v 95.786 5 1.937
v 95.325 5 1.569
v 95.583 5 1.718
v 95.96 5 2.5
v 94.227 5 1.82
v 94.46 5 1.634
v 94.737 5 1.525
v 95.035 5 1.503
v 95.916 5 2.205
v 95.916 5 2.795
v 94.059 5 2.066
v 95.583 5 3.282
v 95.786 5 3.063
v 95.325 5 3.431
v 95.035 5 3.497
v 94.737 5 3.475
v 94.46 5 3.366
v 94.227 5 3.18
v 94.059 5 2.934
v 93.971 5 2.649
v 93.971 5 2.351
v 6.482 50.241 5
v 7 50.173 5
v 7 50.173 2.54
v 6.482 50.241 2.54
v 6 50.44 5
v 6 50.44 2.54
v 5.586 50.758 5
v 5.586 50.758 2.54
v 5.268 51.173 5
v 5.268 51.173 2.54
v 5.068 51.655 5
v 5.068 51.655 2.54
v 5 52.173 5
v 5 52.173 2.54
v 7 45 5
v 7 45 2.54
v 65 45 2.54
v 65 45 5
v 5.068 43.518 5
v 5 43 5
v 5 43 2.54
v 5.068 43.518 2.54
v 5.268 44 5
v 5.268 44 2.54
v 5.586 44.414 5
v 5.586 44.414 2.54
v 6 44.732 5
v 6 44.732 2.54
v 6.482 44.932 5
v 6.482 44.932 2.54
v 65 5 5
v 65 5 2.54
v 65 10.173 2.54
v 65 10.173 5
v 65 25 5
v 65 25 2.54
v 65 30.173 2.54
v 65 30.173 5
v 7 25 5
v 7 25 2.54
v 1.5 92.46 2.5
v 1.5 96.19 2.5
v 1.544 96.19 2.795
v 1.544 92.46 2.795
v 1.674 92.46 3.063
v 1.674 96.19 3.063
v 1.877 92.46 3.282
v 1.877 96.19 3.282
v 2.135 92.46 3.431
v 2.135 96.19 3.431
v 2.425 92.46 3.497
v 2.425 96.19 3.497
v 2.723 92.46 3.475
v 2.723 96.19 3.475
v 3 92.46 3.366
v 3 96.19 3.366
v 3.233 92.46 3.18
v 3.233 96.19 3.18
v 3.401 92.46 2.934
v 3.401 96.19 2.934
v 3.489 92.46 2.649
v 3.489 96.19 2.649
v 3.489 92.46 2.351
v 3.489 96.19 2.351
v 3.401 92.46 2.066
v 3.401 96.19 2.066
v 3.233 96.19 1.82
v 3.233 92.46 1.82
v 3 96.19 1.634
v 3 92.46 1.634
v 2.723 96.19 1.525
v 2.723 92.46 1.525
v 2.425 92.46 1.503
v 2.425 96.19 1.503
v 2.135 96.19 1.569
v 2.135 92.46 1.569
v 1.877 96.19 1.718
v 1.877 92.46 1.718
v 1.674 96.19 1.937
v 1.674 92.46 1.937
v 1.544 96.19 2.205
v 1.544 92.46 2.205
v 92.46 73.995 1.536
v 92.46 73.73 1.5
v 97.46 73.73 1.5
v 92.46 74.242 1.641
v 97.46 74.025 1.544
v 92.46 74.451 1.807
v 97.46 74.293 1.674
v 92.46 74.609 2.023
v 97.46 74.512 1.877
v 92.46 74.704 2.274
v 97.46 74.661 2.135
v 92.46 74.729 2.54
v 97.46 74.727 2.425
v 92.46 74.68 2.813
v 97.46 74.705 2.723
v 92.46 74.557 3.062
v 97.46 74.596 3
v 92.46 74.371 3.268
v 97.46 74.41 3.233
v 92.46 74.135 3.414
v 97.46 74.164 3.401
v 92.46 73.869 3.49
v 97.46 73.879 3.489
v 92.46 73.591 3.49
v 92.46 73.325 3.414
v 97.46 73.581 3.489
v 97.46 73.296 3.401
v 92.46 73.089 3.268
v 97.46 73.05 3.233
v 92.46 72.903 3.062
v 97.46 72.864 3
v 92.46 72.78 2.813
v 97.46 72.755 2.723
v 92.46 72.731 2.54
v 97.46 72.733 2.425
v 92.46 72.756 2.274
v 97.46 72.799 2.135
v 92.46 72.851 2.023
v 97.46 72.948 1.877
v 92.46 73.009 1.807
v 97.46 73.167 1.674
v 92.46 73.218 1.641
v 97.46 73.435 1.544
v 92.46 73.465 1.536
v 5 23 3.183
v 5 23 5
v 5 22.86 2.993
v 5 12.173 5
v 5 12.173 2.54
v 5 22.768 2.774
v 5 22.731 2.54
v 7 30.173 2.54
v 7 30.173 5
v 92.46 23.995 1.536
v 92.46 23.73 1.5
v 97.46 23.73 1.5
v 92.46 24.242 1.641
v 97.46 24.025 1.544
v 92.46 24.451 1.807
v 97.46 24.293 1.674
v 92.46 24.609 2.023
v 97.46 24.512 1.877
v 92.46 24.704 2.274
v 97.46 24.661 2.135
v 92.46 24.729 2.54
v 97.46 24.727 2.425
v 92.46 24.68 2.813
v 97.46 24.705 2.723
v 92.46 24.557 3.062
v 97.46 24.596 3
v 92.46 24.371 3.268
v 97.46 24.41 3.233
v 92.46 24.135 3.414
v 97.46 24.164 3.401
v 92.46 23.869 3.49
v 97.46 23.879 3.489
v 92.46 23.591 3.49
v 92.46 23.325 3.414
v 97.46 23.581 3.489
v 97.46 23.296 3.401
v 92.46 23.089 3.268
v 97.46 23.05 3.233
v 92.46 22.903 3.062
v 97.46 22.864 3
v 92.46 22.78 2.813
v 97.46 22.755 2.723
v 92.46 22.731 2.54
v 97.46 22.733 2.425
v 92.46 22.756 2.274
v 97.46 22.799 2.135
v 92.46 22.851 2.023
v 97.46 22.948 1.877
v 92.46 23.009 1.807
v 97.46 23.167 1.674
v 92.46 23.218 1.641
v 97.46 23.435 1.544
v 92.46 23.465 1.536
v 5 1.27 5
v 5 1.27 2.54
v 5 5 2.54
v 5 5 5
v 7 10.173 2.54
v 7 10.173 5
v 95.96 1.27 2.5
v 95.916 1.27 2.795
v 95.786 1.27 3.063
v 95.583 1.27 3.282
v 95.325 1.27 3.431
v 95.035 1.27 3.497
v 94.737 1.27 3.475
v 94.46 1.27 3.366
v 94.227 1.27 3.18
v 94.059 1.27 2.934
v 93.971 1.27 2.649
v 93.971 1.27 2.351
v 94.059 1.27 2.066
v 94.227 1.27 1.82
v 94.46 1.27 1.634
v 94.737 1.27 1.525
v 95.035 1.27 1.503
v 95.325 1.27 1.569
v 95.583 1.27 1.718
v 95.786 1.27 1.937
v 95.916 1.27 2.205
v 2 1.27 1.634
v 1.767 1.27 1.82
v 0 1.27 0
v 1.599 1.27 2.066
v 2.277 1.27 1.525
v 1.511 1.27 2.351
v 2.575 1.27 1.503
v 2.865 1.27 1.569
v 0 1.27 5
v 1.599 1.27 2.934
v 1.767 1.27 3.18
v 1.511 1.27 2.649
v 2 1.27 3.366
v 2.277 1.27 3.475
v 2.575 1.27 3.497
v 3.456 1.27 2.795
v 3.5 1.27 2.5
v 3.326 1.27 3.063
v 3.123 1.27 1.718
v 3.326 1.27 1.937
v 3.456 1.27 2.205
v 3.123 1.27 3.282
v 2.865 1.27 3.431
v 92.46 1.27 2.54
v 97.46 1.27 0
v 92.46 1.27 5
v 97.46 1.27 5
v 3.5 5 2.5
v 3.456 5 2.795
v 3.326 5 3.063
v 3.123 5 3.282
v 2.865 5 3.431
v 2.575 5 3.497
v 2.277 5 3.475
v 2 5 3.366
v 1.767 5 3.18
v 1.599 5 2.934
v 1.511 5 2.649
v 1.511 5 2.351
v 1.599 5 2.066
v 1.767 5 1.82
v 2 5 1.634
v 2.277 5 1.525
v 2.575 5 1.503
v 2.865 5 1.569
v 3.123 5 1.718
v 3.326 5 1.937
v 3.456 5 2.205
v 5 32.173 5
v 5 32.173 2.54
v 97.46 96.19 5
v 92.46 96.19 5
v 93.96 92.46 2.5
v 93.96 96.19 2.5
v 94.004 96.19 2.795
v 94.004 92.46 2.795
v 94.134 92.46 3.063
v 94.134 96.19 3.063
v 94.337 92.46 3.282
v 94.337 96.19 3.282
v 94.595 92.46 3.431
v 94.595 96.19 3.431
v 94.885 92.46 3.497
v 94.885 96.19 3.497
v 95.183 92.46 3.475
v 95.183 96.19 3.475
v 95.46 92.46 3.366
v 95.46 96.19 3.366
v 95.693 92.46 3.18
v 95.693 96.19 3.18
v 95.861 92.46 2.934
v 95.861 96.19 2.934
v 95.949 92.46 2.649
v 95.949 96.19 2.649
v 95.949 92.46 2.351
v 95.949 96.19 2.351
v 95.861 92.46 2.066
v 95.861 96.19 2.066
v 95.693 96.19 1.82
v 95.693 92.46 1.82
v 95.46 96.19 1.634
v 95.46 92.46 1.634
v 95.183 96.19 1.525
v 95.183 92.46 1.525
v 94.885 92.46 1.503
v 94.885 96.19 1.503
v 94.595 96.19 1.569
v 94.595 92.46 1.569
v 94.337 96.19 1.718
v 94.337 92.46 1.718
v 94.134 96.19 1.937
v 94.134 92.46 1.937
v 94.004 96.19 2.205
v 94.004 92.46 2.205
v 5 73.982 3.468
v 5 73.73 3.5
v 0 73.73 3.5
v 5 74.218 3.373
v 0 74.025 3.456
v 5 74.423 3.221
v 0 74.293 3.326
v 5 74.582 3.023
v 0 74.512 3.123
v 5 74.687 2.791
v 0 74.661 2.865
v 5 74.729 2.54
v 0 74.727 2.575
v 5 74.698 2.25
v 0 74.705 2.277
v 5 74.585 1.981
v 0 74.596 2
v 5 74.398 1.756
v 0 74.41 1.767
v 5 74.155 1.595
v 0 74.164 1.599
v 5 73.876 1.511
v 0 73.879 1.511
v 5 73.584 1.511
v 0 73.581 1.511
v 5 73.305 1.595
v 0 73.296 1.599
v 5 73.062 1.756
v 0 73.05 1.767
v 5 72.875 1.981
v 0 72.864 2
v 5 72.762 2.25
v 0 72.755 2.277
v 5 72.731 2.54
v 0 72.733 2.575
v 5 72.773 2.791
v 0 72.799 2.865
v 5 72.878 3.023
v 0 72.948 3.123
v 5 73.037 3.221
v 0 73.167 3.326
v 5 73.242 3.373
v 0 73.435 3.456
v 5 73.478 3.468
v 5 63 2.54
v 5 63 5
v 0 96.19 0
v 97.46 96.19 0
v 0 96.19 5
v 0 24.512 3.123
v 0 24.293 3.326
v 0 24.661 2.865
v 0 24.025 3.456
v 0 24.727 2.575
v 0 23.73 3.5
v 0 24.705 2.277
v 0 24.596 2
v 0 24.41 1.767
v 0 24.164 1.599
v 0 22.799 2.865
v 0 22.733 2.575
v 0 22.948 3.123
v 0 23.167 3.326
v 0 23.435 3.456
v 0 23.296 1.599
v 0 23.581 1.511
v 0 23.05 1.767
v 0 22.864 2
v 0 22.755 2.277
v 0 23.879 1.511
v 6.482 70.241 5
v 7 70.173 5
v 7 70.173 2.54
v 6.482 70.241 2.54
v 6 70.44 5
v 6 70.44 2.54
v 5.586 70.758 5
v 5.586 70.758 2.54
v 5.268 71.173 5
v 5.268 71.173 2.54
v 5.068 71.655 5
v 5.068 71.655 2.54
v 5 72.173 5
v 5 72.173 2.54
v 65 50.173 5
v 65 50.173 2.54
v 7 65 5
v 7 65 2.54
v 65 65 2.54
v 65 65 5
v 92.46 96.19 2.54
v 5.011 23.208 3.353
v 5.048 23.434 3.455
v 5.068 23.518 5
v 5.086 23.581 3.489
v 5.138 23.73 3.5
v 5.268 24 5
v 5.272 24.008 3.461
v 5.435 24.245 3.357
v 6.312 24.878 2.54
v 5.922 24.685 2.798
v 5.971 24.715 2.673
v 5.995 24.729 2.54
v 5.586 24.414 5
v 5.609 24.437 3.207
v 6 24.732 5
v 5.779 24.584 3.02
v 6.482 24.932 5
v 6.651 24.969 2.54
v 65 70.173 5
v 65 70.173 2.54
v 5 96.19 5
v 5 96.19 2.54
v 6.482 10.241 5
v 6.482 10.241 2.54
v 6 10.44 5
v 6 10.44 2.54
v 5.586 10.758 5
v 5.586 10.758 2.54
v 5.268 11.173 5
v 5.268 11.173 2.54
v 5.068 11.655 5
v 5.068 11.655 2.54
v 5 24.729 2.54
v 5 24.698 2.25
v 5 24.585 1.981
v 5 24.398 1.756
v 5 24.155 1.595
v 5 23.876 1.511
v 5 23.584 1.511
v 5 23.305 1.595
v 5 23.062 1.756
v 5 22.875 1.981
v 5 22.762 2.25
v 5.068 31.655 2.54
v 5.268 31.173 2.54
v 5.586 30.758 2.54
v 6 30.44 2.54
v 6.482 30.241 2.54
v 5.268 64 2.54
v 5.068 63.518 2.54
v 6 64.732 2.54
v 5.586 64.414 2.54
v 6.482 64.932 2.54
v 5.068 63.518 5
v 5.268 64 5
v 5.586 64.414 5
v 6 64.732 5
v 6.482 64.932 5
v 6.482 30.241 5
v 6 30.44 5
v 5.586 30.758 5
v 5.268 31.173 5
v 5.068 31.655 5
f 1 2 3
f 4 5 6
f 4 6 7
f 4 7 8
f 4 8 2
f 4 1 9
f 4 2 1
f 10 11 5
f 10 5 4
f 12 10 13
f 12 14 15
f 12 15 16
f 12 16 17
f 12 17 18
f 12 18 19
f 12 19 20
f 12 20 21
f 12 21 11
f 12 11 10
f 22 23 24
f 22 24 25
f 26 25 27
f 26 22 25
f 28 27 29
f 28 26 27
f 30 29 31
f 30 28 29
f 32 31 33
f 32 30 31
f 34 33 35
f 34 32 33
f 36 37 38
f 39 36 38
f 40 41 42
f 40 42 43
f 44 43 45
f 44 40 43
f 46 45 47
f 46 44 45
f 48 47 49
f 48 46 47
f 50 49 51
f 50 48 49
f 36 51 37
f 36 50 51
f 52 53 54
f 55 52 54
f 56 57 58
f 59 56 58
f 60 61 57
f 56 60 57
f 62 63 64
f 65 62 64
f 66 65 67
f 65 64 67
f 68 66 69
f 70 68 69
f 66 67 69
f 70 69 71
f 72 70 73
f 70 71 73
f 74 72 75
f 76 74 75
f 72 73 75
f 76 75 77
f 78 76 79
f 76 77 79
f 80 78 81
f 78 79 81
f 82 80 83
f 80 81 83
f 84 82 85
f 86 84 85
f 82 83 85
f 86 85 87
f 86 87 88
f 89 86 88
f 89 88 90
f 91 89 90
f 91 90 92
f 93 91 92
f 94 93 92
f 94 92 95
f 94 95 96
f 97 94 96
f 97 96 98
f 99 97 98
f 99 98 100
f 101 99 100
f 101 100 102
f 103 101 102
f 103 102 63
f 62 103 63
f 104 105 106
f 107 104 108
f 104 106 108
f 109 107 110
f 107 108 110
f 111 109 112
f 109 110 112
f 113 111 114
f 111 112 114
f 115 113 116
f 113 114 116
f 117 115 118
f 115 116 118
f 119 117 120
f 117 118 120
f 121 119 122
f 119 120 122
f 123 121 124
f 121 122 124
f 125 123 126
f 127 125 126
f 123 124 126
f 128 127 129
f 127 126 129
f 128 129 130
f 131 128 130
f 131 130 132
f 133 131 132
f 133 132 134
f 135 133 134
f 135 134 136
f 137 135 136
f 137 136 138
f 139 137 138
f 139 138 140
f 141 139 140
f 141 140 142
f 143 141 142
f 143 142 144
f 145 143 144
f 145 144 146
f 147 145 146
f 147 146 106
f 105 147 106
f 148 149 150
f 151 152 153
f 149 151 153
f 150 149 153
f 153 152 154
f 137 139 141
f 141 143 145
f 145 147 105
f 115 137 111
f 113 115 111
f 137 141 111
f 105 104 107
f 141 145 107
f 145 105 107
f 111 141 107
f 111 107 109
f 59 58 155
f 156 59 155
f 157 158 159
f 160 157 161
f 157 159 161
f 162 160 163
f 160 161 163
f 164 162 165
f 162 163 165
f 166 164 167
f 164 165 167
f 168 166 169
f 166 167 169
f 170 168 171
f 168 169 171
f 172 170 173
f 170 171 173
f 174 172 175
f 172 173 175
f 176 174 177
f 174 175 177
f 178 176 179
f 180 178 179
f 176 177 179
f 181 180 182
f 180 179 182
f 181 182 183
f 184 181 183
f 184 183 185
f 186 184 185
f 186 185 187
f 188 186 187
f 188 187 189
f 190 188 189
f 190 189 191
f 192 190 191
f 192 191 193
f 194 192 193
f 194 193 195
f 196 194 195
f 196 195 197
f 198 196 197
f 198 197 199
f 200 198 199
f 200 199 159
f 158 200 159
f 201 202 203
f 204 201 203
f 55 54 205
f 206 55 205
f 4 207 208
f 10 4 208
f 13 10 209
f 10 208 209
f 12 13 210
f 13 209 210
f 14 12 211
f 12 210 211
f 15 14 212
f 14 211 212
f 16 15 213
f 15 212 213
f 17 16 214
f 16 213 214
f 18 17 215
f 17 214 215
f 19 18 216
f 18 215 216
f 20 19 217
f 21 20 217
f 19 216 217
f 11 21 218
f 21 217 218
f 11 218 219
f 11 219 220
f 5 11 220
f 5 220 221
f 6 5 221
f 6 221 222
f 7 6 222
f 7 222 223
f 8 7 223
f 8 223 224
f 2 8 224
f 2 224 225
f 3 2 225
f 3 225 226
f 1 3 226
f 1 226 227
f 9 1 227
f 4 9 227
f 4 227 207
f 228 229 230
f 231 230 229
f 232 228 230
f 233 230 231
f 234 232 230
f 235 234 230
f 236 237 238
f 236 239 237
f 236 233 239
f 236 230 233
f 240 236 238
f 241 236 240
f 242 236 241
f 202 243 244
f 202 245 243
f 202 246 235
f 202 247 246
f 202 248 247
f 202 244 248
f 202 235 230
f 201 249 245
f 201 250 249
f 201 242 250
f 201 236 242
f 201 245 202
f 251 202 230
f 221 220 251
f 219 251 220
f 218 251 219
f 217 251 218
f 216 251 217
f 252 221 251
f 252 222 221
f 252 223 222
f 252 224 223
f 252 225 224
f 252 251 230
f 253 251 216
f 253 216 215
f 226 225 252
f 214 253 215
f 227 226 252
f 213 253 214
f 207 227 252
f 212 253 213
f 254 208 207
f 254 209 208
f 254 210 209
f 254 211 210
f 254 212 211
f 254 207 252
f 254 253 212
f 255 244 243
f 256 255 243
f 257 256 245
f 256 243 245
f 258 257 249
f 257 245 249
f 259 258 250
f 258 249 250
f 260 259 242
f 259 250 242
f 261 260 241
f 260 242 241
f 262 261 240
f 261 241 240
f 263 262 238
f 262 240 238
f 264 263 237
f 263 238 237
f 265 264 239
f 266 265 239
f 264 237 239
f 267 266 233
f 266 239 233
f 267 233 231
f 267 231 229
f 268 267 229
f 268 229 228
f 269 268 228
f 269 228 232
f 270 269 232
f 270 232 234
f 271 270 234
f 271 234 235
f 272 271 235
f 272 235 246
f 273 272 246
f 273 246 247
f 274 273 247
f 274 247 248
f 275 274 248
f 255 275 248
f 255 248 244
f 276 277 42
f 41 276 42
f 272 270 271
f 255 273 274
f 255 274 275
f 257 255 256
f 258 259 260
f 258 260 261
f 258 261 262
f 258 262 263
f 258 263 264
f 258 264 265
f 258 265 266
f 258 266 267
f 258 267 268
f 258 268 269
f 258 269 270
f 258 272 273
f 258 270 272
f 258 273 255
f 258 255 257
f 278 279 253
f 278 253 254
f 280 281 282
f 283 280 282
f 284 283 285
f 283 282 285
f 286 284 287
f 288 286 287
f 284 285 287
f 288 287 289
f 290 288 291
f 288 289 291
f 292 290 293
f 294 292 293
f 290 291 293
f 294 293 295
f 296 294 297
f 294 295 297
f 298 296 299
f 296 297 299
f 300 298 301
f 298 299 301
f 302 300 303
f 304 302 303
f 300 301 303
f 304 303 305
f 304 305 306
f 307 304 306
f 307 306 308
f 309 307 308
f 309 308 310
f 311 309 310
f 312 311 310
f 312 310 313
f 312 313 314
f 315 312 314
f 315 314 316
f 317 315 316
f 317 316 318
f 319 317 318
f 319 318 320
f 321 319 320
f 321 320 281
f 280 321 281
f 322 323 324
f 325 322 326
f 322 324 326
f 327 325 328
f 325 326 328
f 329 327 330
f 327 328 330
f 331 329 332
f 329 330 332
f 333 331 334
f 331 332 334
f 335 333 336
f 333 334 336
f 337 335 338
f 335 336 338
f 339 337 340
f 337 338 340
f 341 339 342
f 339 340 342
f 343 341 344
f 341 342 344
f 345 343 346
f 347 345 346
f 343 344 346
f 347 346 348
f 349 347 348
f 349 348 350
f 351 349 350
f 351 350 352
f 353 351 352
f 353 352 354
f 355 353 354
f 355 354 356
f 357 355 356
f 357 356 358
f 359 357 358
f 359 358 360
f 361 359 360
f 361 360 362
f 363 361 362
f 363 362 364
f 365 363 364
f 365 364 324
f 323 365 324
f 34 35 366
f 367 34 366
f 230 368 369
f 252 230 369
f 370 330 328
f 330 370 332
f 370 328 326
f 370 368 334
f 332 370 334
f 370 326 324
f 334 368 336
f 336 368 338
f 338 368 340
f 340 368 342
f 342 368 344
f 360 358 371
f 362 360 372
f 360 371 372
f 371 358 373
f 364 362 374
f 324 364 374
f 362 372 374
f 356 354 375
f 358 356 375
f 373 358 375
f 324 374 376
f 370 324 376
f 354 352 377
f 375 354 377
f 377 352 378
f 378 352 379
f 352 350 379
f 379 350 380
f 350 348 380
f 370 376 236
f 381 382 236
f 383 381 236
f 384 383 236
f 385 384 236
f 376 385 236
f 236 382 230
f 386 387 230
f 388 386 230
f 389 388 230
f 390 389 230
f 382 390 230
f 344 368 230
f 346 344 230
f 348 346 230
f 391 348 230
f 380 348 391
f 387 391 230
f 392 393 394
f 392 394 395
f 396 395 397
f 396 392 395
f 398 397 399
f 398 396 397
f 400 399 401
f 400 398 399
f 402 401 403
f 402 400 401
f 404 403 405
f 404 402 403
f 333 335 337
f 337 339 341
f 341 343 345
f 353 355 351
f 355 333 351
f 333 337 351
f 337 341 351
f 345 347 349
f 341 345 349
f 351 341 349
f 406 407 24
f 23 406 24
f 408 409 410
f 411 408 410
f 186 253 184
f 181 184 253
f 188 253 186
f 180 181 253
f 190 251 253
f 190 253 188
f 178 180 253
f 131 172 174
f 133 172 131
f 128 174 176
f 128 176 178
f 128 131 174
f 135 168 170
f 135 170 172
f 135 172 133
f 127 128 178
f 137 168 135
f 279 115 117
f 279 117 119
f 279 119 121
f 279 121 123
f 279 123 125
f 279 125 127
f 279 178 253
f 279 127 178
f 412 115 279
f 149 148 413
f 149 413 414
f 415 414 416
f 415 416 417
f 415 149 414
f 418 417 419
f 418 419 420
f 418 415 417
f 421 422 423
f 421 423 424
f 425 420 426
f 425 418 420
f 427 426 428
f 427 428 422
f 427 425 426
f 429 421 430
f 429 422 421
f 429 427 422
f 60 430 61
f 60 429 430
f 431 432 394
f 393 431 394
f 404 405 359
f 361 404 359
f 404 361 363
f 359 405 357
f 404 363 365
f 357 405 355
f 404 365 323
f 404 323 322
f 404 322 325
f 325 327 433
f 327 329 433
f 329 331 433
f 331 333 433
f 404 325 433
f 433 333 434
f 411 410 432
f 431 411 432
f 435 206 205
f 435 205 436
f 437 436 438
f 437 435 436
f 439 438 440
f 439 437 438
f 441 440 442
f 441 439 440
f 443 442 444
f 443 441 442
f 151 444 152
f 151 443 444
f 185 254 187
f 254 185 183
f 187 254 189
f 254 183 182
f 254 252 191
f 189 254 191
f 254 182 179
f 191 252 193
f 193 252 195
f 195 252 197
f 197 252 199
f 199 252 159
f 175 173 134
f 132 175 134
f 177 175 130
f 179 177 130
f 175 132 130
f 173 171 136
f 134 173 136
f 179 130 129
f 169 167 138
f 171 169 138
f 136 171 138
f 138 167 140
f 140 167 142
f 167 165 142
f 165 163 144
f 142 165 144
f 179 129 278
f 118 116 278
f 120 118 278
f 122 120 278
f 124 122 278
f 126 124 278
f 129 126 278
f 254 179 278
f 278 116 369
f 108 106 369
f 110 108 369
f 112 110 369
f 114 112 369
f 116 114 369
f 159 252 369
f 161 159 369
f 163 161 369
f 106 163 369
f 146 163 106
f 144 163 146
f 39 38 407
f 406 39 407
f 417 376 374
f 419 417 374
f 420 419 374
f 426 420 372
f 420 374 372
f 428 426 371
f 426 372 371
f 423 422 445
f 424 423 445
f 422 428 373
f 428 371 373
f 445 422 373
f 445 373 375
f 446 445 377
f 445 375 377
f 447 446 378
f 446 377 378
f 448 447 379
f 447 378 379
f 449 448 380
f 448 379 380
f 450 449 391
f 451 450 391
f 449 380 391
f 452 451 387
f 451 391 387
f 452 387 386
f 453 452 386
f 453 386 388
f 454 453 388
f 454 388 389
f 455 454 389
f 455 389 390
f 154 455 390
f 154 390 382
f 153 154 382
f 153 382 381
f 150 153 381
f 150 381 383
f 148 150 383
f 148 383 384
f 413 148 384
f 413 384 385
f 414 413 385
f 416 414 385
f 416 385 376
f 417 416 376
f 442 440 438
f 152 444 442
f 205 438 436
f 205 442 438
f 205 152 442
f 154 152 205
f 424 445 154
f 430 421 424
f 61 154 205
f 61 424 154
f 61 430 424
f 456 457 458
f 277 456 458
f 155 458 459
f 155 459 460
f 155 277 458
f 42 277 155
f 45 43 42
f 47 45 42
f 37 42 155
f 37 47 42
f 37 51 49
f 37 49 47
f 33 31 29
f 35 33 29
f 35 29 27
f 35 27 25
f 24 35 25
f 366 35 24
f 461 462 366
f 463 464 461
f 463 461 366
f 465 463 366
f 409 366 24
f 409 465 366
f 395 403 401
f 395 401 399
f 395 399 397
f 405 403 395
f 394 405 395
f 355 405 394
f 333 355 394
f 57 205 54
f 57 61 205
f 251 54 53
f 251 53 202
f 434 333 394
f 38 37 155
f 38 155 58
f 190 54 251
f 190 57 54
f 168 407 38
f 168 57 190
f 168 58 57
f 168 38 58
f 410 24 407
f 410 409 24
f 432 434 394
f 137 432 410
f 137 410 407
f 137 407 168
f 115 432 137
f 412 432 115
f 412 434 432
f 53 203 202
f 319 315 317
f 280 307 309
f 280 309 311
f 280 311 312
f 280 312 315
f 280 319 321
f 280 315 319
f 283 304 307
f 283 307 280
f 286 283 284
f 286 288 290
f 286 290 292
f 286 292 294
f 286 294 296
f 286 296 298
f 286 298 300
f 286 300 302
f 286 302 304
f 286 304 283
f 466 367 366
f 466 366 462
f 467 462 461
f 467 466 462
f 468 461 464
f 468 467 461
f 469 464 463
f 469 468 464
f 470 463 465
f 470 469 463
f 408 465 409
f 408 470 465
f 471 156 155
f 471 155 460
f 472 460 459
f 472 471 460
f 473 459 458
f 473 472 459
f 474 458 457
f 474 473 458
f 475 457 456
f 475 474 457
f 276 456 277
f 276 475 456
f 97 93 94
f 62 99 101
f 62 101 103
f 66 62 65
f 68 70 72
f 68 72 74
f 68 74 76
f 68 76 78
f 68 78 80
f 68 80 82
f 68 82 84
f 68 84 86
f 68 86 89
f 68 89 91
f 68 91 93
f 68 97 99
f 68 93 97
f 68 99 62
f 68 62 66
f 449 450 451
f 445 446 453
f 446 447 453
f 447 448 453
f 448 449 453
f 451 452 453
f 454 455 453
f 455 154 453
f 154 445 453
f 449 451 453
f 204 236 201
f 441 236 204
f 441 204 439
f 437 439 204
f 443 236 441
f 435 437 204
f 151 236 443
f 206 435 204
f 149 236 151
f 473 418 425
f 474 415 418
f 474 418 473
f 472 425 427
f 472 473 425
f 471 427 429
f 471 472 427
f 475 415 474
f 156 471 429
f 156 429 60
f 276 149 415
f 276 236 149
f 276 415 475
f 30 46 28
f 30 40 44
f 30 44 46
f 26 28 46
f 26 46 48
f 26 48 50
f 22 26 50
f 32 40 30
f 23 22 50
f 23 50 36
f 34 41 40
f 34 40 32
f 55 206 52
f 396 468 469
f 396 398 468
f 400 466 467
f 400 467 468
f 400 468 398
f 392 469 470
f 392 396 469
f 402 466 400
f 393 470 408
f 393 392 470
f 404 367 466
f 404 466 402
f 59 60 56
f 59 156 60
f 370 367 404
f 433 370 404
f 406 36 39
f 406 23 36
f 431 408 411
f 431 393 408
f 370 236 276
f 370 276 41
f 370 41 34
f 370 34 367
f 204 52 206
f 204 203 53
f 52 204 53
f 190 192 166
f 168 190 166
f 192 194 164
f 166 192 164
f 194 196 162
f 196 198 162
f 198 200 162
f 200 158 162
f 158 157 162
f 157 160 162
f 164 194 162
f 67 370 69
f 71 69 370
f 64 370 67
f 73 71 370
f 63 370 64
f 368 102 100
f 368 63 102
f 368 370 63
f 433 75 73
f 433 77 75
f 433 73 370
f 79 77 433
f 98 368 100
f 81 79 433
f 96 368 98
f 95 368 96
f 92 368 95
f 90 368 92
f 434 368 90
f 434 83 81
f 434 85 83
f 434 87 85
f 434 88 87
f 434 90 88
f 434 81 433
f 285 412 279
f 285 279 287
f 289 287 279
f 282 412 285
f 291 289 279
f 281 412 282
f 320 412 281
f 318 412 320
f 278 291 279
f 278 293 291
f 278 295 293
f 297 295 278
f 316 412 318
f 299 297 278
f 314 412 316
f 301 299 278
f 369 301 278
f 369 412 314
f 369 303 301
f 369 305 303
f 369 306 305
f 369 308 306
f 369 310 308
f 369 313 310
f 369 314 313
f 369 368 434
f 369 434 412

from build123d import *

# Parameters (mm, degrees)
SKETCH1_W           = 97.46
SKETCH1_H           = 97.46
BOSS_EXTRUDE1_DEPTH = 1.27
SKETCH3_W           = 5
SKETCH3_H           = 97.46
BOSS_EXTRUDE2_DEPTH = 3.73
SKETCH7_R           = 1
CUT_EXTRUDE2_DEPTH  = 5
SKETCH6_R           = 1
CUT_EXTRUDE3_DEPTH  = 5
SKETCH4_R           = 1
CUT_EXTRUDE4_DEPTH  = 5
SKETCH5_R           = 1
CUT_EXTRUDE5_DEPTH  = 5
FILLET1_R           = 2
SKETCH8_R           = 1
CUT_EXTRUDE6_DEPTH  = 10
SKETCH9_R           = 1
CUT_EXTRUDE7_DEPTH  = 10
BOSS_EXTRUDE3_DEPTH = 1.27
CUT_EXTRUDE8_DEPTH  = 1.27
CUT_EXTRUDE9_DEPTH  = 1.27


with BuildPart() as part:
    # Sketch1 → Boss-Extrude1 (new body)
    with BuildSketch(Plane.XY):
        with Locations((48.73, 48.73)):
            Rectangle(SKETCH1_W, SKETCH1_H)
    extrude(amount=BOSS_EXTRUDE1_DEPTH)

    # Sketch3 → Boss-Extrude2 (add)
    with BuildSketch(Plane.XY.offset(1.27)):
        Polygon((0, 0), (5, 0), (5, 5), (65, 5), (65, 10.172513956), (5, 10.172513956), (5, 25), (65, 25), (65, 30.172513956), (5, 30.172513956), (5, 45), (65, 45), (65, 50.172513956), (5, 50.172513956), (5, 65), (65, 65), (65, 70.172513956), (5, 70.172513956), (5, 97.46), (0, 97.46), align=None)
        with Locations((94.96, 48.73)):
            Rectangle(SKETCH3_W, SKETCH3_H)
    extrude(amount=BOSS_EXTRUDE2_DEPTH)

    # Sketch7 → Cut-Extrude2 (cut)
    with BuildSketch(Plane(origin=(0, 97.46, 0), x_dir=(-1, 0, 0), z_dir=(0, 1, 0))):
        with Locations((-2.5, 2.5)):
            Circle(SKETCH7_R)
    extrude(amount=-CUT_EXTRUDE2_DEPTH, mode=Mode.SUBTRACT)

    # Sketch6 → Cut-Extrude3 (cut)
    with BuildSketch(Plane(origin=(0, 97.46, 0), x_dir=(-1, 0, 0), z_dir=(0, 1, 0))):
        with Locations((-94.96, 2.5)):
            Circle(SKETCH6_R)
    extrude(amount=-CUT_EXTRUDE3_DEPTH, mode=Mode.SUBTRACT)

    # Sketch4 → Cut-Extrude4 (cut)
    with BuildSketch(Plane.XZ):
        with Locations((94.96, 2.5)):
            Circle(SKETCH4_R)
    extrude(amount=-CUT_EXTRUDE4_DEPTH, mode=Mode.SUBTRACT)

    # Sketch5 → Cut-Extrude5 (cut)
    with BuildSketch(Plane.XZ):
        with Locations((2.5, 2.5)):
            Circle(SKETCH5_R)
    extrude(amount=-CUT_EXTRUDE5_DEPTH, mode=Mode.SUBTRACT)

    # Fillet1
    fillet1_edges = [part.edges().sort_by_distance(p)[0] for p in [
        (5, 70.172513956, 3.135),
        (5, 50.172513956, 3.135),
        (5, 30.172513956, 3.135),
        (5, 10.172513956, 3.135),
        (5, 65, 3.135),
        (5, 45, 3.135),
        (5, 25, 3.135),
    ]]
    fillet(fillet1_edges, radius=FILLET1_R)

    # Sketch8 → Cut-Extrude6 (cut)
    with BuildSketch(Plane.ZY):
        with Locations((2.5, 23.73)):
            Circle(SKETCH8_R)
        with Locations((2.5, 73.73)):
            Circle(SKETCH8_R)
    extrude(amount=-CUT_EXTRUDE6_DEPTH, mode=Mode.SUBTRACT)

    # Sketch9 → Cut-Extrude7 (cut)
    with BuildSketch(Plane(origin=(97.46, 0, 0), x_dir=(0, 0, -1), z_dir=(1, 0, 0))):
        with Locations((-2.5, 73.73)):
            Circle(SKETCH9_R)
        with Locations((-2.5, 23.73)):
            Circle(SKETCH9_R)
    extrude(amount=-CUT_EXTRUDE7_DEPTH, mode=Mode.SUBTRACT)

    # Sketch3<5> → Boss-Extrude3 (add)
    with BuildSketch(Plane.XY.offset(1.27)):
        Polygon((65, 5), (5, 5), (5, 0), (92.46, 0), (92.46, 5), (92.46, 92.46), (92.46, 97.46), (5, 97.46), (5, 92.46), (5, 70.172513956), (65, 70.172513956), (65, 65), (5, 65), (5, 50.172513956), (65, 50.172513956), (65, 45), (5, 45), (5, 30.172513956), (65, 30.172513956), (65, 25), (5, 25), (5, 10.172513956), (65, 10.172513956), align=None)
    extrude(amount=BOSS_EXTRUDE3_DEPTH)

    # Sketch10 → Cut-Extrude8 (cut)
    with BuildSketch(Plane.XZ):
        Polygon((5, 5), (0, 5), (0, 0), (97.46, 0), (97.46, 5), (92.46, 5), (92.46, 2.54), (5, 2.54), align=None)
    extrude(amount=-CUT_EXTRUDE8_DEPTH, mode=Mode.SUBTRACT)

    # Sketch11 → Cut-Extrude9 (cut)
    with BuildSketch(Plane(origin=(0, 97.46, 0), x_dir=(1, 0, 0), z_dir=(0, 1, 0))):
        Polygon((92.46, -2.54), (92.46, -5), (97.46, -5), (97.46, 0), (0, 0), (0, -5), (5, -5), (5, -2.54), align=None)
    extrude(amount=-CUT_EXTRUDE9_DEPTH, mode=Mode.SUBTRACT)


solid = part.part
